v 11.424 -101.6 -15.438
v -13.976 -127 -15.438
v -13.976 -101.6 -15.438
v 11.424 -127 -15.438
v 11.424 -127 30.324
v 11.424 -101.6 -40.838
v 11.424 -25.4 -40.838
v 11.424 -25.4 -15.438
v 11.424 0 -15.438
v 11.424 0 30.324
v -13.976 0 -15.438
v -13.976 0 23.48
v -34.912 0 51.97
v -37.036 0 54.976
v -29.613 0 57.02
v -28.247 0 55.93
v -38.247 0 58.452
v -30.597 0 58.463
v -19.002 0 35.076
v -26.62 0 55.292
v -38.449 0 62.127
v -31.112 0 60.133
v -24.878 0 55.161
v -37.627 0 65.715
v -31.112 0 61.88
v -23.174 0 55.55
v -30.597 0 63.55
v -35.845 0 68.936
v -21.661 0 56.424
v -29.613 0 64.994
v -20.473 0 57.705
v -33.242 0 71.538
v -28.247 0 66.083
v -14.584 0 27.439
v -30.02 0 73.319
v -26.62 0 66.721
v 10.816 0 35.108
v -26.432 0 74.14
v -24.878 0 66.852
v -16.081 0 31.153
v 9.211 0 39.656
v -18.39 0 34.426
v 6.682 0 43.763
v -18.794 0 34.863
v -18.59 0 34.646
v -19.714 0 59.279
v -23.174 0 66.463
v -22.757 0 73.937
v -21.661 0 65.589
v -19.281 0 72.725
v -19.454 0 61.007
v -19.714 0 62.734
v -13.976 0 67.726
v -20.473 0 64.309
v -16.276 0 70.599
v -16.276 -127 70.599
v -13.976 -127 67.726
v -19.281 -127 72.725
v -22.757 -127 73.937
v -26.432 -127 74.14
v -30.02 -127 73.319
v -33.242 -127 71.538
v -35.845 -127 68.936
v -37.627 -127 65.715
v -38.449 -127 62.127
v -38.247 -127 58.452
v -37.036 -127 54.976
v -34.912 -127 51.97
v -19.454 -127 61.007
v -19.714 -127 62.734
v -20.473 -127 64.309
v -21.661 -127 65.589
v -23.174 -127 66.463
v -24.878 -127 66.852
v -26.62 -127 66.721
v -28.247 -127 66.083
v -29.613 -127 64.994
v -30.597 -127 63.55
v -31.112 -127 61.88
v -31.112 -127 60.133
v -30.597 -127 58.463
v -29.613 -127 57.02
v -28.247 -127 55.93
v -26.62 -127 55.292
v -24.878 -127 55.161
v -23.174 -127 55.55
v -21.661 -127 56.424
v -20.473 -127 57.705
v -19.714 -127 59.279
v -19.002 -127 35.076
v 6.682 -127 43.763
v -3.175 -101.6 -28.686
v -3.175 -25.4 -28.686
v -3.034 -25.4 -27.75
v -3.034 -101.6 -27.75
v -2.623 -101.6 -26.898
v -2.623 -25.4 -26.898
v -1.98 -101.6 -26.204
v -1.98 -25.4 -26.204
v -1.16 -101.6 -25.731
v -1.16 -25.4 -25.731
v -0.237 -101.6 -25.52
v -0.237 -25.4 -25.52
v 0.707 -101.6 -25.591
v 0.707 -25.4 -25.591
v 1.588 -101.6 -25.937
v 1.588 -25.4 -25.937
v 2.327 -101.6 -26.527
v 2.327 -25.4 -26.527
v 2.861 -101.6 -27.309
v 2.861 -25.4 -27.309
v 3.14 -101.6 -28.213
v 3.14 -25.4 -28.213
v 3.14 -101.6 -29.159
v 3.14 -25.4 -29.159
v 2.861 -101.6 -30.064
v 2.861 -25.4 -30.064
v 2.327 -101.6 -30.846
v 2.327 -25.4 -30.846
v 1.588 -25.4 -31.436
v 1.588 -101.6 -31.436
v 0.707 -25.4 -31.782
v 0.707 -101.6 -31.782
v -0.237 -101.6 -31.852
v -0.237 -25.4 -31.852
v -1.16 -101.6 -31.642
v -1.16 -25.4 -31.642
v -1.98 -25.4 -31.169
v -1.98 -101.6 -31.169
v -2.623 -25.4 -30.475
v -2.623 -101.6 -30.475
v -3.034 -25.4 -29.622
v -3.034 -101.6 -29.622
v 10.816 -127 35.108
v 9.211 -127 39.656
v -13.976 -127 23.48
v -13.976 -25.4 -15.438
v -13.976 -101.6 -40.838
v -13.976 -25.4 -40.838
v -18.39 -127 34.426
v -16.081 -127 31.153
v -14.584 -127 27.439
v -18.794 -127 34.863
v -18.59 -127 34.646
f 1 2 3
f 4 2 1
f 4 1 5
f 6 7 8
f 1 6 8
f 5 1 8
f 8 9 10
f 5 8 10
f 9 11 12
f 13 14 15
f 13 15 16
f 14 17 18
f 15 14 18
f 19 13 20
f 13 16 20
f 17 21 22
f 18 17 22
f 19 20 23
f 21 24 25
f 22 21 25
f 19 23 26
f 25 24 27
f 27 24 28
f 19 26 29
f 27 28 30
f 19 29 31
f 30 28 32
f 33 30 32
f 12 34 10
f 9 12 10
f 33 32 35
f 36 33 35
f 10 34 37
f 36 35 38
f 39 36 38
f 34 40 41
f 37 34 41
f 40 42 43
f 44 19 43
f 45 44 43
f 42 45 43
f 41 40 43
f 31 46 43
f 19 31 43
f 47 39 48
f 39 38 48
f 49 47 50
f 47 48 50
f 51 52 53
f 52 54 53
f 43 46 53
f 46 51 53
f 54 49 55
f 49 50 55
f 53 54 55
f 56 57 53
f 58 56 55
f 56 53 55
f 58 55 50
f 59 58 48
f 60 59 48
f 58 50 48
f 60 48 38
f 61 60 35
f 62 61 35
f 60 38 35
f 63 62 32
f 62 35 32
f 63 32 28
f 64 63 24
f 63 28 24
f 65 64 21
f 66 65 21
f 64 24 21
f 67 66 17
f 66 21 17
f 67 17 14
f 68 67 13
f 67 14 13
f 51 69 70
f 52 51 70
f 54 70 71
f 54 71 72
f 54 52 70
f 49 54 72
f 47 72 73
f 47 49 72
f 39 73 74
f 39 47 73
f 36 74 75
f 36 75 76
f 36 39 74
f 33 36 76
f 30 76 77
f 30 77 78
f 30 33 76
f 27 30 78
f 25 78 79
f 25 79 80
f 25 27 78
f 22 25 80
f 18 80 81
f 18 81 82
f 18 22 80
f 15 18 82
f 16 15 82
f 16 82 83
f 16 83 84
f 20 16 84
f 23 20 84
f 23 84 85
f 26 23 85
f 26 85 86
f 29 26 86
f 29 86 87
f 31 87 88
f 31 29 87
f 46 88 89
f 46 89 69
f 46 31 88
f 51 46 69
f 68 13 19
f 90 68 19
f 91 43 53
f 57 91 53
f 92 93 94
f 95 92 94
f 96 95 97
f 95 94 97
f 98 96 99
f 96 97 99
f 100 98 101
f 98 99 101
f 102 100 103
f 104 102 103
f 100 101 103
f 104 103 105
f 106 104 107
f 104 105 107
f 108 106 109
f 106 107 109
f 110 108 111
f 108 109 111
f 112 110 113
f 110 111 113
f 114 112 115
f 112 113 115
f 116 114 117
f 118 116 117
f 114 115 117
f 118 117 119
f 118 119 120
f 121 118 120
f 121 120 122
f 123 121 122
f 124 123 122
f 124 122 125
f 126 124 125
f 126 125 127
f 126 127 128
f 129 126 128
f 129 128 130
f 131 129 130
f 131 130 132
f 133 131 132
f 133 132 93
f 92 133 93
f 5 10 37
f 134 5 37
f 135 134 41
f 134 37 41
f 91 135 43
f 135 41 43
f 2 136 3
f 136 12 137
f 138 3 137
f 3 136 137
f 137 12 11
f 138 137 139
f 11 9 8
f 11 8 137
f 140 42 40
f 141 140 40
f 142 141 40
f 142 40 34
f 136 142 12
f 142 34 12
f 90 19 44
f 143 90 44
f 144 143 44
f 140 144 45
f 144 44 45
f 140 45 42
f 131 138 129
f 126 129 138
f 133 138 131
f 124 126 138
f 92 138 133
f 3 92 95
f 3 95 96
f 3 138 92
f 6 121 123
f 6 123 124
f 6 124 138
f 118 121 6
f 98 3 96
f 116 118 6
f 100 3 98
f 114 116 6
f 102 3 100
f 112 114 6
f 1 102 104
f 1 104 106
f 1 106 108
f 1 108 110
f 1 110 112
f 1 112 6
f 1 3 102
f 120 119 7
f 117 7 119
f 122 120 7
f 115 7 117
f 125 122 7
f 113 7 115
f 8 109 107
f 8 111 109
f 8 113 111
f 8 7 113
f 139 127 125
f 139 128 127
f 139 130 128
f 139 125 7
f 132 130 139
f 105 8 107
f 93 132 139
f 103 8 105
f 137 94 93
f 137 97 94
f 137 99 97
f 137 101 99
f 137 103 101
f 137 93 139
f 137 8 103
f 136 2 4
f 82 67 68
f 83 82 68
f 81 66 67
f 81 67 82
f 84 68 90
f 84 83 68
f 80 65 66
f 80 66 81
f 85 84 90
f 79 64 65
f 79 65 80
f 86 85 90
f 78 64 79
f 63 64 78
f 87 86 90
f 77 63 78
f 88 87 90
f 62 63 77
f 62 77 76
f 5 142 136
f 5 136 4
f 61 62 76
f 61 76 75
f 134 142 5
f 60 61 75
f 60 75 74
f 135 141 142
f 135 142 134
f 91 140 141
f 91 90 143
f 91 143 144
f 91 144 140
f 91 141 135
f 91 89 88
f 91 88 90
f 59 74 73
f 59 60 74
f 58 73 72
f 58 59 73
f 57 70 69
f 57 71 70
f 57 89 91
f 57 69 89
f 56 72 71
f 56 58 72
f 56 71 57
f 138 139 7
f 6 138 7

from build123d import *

# Parameters (mm, degrees)
F0_R     = 5.861767
F1_DEPTH = 127
F2_W     = 25.4
F2_H     = 25.4
F3_DEPTH = 25.4
F4_W     = 25.4
F4_H     = 25.4
F5_DEPTH = 25.4
F7_D     = 6.35


with BuildPart() as f1:
    # F0 (on Front) → F1 (new body)
    with BuildSketch(Plane.XZ):
        with BuildLine():
            Line((-13.975801, 23.479906), (-13.975801, -40.838215))
            Line((-13.975801, -40.838215), (11.424199, -40.838215))
            Line((11.424199, -40.838215), (11.424199, 29.419485))
            Line((11.424199, 29.419485), (11.424199, 30.323507))
            ThreePointArc((11.424199, 30.323507), (10.135022, 37.425094), (6.681635, 43.762966))
            Line((6.681635, 43.762966), (-13.975801, 67.725592))
            ThreePointArc((-13.975801, 67.725592), (-33.241845, 71.538413), (-34.911566, 51.969814))
            Line((-34.911566, 51.969814), (-19.002141, 35.0763))
            ThreePointArc((-19.002141, 35.0763), (-18.691723, 34.755054), (-18.389663, 34.425937))
            ThreePointArc((-18.389663, 34.425937), (-15.225185, 29.339041), (-13.975801, 23.479906))
        make_face()
        with Locations((-25.315826, 61.006578)):
            Circle(F0_R, mode=Mode.SUBTRACT)
    extrude(amount=F1_DEPTH)

    # F2 (on face) → F3 (cut)
    with BuildSketch(Plane.XZ.offset(127)):
        with Locations((-1.275801, -28.138215)):
            Rectangle(F2_W, F2_H)
    extrude(amount=-F3_DEPTH, mode=Mode.SUBTRACT)

    # F4 (on face) → F5 (cut)
    with BuildSketch(Plane(origin=(0, 0, 0), x_dir=(-1, 0, 0), z_dir=(0, 1, 0))):
        with Locations((1.275801, -28.138215)):
            Rectangle(F4_W, F4_H)
    extrude(amount=-F5_DEPTH, mode=Mode.SUBTRACT)

    # F7 (through all)
    with Locations(Plane.XZ.offset(101.6)):
        with Locations((0, -28.686289)):
            Hole(F7_D / 2)


solid = f1.part
